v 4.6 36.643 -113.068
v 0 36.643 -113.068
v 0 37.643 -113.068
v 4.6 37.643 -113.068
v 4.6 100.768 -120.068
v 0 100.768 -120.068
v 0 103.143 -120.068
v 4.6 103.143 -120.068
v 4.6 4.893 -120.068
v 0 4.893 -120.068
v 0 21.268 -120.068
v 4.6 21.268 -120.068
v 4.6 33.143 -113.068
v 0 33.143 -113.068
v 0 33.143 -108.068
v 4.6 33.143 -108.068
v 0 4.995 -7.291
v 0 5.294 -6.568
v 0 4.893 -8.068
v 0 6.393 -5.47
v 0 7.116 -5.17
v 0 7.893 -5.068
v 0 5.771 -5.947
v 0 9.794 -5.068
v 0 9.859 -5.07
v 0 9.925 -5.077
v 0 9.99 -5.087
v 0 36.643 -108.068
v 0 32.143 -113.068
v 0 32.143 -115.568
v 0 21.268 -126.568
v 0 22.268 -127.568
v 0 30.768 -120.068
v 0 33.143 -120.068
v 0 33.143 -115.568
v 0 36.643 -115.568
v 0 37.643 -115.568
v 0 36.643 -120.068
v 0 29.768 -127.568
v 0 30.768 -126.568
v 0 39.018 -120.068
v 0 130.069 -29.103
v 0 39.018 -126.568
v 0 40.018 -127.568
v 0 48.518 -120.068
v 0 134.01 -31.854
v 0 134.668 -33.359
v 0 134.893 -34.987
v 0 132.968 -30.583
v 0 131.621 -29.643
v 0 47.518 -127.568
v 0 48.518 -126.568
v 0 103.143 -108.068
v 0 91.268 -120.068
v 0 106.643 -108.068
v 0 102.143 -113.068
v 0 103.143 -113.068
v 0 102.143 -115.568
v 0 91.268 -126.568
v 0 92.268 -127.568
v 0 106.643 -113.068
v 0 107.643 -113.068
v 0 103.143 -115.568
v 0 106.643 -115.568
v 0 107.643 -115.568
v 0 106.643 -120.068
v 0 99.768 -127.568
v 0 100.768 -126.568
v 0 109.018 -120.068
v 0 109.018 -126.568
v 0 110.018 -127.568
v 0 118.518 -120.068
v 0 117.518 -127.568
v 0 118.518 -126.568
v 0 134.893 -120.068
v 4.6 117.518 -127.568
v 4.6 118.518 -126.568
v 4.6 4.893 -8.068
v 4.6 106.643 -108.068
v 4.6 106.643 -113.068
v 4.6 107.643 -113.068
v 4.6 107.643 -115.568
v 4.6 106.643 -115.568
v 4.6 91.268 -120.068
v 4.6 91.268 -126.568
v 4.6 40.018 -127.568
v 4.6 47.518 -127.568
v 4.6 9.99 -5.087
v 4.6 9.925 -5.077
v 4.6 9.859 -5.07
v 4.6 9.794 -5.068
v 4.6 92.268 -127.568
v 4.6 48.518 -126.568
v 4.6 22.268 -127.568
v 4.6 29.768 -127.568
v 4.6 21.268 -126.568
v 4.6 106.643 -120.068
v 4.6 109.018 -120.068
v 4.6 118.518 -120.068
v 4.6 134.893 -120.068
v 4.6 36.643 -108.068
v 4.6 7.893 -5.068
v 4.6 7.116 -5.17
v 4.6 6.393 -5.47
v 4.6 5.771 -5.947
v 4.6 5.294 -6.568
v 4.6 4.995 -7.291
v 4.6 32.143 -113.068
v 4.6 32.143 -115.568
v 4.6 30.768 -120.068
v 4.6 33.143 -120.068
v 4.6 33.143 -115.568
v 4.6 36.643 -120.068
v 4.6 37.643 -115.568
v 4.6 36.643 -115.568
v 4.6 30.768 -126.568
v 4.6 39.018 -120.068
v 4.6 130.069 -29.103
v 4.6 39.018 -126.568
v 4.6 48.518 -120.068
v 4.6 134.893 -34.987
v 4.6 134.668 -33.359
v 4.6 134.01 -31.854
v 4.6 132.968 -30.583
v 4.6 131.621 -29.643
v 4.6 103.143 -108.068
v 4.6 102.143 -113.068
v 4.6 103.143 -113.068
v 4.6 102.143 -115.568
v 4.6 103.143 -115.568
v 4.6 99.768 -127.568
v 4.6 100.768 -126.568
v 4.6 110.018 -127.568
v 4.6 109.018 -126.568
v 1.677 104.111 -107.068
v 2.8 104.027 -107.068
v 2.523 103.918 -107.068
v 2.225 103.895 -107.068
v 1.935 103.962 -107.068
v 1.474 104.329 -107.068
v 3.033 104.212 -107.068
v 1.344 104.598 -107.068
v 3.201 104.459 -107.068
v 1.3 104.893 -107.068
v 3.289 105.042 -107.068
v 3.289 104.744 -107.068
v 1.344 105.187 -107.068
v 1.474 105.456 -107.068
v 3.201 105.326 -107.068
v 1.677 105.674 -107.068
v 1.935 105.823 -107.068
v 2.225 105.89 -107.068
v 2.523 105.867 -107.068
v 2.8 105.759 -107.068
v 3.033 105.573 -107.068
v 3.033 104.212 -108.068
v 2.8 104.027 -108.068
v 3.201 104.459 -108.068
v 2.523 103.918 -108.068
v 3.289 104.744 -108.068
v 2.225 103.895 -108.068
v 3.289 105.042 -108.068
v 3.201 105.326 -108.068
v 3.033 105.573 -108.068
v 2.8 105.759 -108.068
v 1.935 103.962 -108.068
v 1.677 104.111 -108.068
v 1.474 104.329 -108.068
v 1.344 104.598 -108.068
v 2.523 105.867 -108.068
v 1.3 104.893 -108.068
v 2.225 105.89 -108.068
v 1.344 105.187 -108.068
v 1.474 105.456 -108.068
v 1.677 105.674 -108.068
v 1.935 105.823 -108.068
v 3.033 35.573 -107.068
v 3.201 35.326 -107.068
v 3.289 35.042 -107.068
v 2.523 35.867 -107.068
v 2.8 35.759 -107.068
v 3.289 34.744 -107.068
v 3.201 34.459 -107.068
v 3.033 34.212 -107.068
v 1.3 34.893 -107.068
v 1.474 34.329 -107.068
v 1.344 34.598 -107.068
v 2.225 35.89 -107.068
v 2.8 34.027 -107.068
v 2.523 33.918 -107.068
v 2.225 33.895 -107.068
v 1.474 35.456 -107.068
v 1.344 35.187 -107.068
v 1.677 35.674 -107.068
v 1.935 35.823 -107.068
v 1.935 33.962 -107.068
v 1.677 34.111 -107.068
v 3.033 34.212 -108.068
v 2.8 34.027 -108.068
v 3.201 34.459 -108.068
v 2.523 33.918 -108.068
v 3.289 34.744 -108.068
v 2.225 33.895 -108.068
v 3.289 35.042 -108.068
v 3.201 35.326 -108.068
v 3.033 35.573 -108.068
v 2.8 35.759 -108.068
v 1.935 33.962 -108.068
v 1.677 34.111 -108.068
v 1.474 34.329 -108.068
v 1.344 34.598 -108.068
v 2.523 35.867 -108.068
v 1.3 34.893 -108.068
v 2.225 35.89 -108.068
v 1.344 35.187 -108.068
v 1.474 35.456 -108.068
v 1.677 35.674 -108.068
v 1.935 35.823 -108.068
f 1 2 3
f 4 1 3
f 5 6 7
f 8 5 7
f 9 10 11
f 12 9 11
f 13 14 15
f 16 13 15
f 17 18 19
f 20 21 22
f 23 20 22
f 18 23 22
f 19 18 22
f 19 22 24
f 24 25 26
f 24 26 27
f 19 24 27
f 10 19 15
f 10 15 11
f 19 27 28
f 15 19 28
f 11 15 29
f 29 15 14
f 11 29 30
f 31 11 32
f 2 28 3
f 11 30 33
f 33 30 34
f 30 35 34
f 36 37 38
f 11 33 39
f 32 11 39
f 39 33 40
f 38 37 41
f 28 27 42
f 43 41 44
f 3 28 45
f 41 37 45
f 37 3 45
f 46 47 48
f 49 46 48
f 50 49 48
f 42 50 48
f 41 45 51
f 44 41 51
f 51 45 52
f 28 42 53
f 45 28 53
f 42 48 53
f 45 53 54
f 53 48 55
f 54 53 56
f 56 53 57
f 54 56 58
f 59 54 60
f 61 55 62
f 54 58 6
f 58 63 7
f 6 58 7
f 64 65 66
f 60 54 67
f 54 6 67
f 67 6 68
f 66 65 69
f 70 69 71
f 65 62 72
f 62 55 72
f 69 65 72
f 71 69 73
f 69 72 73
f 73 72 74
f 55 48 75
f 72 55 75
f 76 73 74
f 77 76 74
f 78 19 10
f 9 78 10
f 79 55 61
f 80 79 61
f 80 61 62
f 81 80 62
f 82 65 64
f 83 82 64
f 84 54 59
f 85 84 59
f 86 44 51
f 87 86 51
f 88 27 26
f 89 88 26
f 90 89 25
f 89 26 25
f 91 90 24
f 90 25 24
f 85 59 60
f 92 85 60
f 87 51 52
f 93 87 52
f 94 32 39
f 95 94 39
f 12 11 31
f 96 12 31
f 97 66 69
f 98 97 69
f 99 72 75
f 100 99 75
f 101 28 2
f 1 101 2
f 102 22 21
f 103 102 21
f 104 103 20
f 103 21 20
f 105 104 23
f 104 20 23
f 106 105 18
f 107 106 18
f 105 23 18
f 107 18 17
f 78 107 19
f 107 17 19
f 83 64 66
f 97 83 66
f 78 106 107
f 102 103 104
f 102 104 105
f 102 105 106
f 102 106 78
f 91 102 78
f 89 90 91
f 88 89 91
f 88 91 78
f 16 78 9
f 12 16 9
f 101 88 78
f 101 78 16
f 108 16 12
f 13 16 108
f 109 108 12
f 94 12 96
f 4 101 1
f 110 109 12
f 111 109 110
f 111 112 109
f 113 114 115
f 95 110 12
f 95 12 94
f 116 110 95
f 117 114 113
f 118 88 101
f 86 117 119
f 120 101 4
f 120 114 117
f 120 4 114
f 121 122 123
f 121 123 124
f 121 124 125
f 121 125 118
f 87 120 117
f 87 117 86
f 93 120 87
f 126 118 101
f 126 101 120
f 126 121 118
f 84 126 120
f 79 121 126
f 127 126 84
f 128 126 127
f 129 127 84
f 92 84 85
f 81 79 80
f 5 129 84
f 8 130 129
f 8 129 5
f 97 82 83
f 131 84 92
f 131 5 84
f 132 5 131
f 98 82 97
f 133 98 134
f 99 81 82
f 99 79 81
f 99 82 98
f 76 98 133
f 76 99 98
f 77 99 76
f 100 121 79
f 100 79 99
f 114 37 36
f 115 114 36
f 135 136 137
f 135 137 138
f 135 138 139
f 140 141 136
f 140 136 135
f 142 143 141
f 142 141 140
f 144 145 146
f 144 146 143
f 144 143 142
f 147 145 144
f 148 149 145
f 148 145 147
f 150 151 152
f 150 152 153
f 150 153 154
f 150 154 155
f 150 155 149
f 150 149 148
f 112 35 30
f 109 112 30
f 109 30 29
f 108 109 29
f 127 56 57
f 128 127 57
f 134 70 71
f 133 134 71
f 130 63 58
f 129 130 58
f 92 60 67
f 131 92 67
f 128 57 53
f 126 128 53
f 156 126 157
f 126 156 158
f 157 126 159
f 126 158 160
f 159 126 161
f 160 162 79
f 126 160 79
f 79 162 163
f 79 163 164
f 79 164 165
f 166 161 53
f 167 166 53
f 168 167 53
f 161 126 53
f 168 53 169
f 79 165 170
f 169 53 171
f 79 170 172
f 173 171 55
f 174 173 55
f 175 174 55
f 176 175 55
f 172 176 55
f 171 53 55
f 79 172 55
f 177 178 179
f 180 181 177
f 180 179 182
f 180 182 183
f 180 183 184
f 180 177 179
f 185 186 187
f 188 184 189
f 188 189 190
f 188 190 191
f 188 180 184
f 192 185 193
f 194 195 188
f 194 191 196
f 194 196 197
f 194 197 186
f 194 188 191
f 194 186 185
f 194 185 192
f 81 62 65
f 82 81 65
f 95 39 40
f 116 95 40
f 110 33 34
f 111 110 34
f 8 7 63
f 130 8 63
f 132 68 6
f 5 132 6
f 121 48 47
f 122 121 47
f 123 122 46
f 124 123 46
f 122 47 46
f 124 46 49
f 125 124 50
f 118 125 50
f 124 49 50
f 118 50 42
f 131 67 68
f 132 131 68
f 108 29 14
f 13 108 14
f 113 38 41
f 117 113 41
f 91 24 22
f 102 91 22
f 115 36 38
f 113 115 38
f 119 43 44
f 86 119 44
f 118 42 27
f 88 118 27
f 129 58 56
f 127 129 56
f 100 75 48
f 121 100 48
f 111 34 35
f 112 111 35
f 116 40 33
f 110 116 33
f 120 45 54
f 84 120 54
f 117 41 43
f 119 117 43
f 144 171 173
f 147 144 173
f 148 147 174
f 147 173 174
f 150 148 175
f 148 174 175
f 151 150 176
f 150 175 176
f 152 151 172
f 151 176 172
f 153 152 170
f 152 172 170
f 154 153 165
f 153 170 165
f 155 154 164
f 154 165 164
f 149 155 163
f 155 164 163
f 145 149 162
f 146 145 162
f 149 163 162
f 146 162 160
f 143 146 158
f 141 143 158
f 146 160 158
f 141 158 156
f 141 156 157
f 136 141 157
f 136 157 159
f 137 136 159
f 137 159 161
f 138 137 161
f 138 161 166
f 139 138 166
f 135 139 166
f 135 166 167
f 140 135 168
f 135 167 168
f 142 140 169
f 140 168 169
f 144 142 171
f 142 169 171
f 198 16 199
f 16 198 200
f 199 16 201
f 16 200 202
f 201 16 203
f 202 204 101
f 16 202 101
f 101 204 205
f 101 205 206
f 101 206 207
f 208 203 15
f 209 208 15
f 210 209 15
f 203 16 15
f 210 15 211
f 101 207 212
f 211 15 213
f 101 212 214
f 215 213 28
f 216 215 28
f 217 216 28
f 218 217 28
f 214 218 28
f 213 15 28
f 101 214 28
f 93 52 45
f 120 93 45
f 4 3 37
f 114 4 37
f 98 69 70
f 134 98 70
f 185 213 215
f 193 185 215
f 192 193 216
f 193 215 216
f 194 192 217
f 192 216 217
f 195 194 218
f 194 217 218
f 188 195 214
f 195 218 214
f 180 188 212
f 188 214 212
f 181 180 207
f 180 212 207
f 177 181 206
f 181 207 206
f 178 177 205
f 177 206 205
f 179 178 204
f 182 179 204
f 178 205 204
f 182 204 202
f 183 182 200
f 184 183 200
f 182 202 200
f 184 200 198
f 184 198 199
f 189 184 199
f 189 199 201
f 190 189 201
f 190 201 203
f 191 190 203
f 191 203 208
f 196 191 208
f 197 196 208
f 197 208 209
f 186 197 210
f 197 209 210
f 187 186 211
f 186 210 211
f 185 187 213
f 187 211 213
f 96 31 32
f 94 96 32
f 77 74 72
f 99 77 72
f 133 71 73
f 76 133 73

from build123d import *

# Parameters (mm, degrees)
EXTRUDE1_DEPTH = 4.6
SKETCH2_R      = 1
EXTRUDE2_DEPTH = 1


with BuildPart() as part:
    # Sketch1 → Extrude1 (new body)
    with BuildSketch(Plane(origin=(0, 0, 0), x_dir=(0, 0, -1), z_dir=(1, 0, 0))):
        with BuildLine():
            Line((120.06791936, 91.267546052), (126.56791936, 91.267546052))
            Line((126.56791936, 91.267546052), (127.56791936, 92.267546052))
            Line((127.56791936, 92.267546052), (127.56791936, 99.767546052))
            Line((127.56791936, 99.767546052), (126.56791936, 100.767546052))
            Line((126.56791936, 100.767546052), (120.06791936, 100.767546052))
            Line((120.06791936, 100.767546052), (120.06791936, 103.142546052))
            Line((120.06791936, 103.142546052), (115.56791936, 103.142546052))
            Line((115.56791936, 103.142546052), (115.56791936, 102.142546052))
            Line((115.56791936, 102.142546052), (113.06791936, 102.142546052))
            Line((113.06791936, 102.142546052), (113.06791936, 103.142546052))
            Line((113.06791936, 103.142546052), (108.06791936, 103.142546052))
            Line((108.06791936, 103.142546052), (108.06791936, 106.642546052))
            Line((108.06791936, 106.642546052), (113.06791936, 106.642546052))
            Line((113.06791936, 106.642546052), (113.06791936, 107.642546052))
            Line((113.06791936, 107.642546052), (115.56791936, 107.642546052))
            Line((115.56791936, 107.642546052), (115.56791936, 106.642546052))
            Line((115.56791936, 106.642546052), (120.06791936, 106.642546052))
            Line((120.06791936, 106.642546052), (120.06791936, 109.017546052))
            Line((120.06791936, 109.017546052), (126.56791936, 109.017546052))
            Line((126.56791936, 109.017546052), (127.56791936, 110.017546052))
            Line((127.56791936, 110.017546052), (127.56791936, 117.517546052))
            Line((127.56791936, 117.517546052), (126.56791936, 118.517546052))
            Line((126.56791936, 118.517546052), (120.06791936, 118.517546052))
            Line((120.06791936, 118.517546052), (120.06791936, 134.892546052))
            Line((120.06791936, 134.892546052), (34.986742776, 134.892546052))
            ThreePointArc((34.986742776, 134.892546052), (31.182809342, 133.5325989), (29.103258722, 130.069242862))
            Line((29.103258722, 130.069242862), (5.087338684, 9.989642673))
            ThreePointArc((5.087338684, 9.989642673), (5.072786033, 9.892064156), (5.06791936, 9.793526538))
            Line((5.06791936, 9.793526538), (5.06791936, 7.892546052))
            ThreePointArc((5.06791936, 7.892546052), (5.946599016, 5.771225708), (8.06791936, 4.892546052))
            Line((8.06791936, 4.892546052), (120.06791936, 4.892546052))
            Line((120.06791936, 4.892546052), (120.06791936, 21.267546052))
            Line((120.06791936, 21.267546052), (126.56791936, 21.267546052))
            Line((126.56791936, 21.267546052), (127.56791936, 22.267546052))
            Line((127.56791936, 22.267546052), (127.56791936, 29.767546052))
            Line((127.56791936, 29.767546052), (126.56791936, 30.767546052))
            Line((126.56791936, 30.767546052), (120.06791936, 30.767546052))
            Line((120.06791936, 30.767546052), (120.06791936, 33.142546052))
            Line((120.06791936, 33.142546052), (115.56791936, 33.142546052))
            Line((115.56791936, 33.142546052), (115.56791936, 32.142546052))
            Line((115.56791936, 32.142546052), (113.06791936, 32.142546052))
            Line((113.06791936, 32.142546052), (113.06791936, 33.142546052))
            Line((113.06791936, 33.142546052), (108.06791936, 33.142546052))
            Line((108.06791936, 33.142546052), (108.06791936, 36.642546052))
            Line((108.06791936, 36.642546052), (113.06791936, 36.642546052))
            Line((113.06791936, 36.642546052), (113.06791936, 37.642546052))
            Line((113.06791936, 37.642546052), (115.56791936, 37.642546052))
            Line((115.56791936, 37.642546052), (115.56791936, 36.642546052))
            Line((115.56791936, 36.642546052), (120.06791936, 36.642546052))
            Line((120.06791936, 36.642546052), (120.06791936, 39.017546052))
            Line((120.06791936, 39.017546052), (126.56791936, 39.017546052))
            Line((126.56791936, 39.017546052), (127.56791936, 40.017546052))
            Line((127.56791936, 40.017546052), (127.56791936, 47.517546052))
            Line((127.56791936, 47.517546052), (126.56791936, 48.517546052))
            Line((126.56791936, 48.517546052), (120.06791936, 48.517546052))
            Line((120.06791936, 48.517546052), (120.06791936, 91.267546052))
        make_face()
    extrude(amount=EXTRUDE1_DEPTH)

    # Sketch2 → Extrude2 (cut)
    with BuildSketch(Plane(origin=(0, 0, -108.06791936), x_dir=(-1, 0, 0), z_dir=(0, 0, -1))):
        with Locations((-2.3, 34.892546052)):
            Circle(SKETCH2_R)
        with Locations((-2.3, 104.892546052)):
            Circle(SKETCH2_R)
    extrude(amount=-EXTRUDE2_DEPTH, mode=Mode.SUBTRACT)


solid = part.part
